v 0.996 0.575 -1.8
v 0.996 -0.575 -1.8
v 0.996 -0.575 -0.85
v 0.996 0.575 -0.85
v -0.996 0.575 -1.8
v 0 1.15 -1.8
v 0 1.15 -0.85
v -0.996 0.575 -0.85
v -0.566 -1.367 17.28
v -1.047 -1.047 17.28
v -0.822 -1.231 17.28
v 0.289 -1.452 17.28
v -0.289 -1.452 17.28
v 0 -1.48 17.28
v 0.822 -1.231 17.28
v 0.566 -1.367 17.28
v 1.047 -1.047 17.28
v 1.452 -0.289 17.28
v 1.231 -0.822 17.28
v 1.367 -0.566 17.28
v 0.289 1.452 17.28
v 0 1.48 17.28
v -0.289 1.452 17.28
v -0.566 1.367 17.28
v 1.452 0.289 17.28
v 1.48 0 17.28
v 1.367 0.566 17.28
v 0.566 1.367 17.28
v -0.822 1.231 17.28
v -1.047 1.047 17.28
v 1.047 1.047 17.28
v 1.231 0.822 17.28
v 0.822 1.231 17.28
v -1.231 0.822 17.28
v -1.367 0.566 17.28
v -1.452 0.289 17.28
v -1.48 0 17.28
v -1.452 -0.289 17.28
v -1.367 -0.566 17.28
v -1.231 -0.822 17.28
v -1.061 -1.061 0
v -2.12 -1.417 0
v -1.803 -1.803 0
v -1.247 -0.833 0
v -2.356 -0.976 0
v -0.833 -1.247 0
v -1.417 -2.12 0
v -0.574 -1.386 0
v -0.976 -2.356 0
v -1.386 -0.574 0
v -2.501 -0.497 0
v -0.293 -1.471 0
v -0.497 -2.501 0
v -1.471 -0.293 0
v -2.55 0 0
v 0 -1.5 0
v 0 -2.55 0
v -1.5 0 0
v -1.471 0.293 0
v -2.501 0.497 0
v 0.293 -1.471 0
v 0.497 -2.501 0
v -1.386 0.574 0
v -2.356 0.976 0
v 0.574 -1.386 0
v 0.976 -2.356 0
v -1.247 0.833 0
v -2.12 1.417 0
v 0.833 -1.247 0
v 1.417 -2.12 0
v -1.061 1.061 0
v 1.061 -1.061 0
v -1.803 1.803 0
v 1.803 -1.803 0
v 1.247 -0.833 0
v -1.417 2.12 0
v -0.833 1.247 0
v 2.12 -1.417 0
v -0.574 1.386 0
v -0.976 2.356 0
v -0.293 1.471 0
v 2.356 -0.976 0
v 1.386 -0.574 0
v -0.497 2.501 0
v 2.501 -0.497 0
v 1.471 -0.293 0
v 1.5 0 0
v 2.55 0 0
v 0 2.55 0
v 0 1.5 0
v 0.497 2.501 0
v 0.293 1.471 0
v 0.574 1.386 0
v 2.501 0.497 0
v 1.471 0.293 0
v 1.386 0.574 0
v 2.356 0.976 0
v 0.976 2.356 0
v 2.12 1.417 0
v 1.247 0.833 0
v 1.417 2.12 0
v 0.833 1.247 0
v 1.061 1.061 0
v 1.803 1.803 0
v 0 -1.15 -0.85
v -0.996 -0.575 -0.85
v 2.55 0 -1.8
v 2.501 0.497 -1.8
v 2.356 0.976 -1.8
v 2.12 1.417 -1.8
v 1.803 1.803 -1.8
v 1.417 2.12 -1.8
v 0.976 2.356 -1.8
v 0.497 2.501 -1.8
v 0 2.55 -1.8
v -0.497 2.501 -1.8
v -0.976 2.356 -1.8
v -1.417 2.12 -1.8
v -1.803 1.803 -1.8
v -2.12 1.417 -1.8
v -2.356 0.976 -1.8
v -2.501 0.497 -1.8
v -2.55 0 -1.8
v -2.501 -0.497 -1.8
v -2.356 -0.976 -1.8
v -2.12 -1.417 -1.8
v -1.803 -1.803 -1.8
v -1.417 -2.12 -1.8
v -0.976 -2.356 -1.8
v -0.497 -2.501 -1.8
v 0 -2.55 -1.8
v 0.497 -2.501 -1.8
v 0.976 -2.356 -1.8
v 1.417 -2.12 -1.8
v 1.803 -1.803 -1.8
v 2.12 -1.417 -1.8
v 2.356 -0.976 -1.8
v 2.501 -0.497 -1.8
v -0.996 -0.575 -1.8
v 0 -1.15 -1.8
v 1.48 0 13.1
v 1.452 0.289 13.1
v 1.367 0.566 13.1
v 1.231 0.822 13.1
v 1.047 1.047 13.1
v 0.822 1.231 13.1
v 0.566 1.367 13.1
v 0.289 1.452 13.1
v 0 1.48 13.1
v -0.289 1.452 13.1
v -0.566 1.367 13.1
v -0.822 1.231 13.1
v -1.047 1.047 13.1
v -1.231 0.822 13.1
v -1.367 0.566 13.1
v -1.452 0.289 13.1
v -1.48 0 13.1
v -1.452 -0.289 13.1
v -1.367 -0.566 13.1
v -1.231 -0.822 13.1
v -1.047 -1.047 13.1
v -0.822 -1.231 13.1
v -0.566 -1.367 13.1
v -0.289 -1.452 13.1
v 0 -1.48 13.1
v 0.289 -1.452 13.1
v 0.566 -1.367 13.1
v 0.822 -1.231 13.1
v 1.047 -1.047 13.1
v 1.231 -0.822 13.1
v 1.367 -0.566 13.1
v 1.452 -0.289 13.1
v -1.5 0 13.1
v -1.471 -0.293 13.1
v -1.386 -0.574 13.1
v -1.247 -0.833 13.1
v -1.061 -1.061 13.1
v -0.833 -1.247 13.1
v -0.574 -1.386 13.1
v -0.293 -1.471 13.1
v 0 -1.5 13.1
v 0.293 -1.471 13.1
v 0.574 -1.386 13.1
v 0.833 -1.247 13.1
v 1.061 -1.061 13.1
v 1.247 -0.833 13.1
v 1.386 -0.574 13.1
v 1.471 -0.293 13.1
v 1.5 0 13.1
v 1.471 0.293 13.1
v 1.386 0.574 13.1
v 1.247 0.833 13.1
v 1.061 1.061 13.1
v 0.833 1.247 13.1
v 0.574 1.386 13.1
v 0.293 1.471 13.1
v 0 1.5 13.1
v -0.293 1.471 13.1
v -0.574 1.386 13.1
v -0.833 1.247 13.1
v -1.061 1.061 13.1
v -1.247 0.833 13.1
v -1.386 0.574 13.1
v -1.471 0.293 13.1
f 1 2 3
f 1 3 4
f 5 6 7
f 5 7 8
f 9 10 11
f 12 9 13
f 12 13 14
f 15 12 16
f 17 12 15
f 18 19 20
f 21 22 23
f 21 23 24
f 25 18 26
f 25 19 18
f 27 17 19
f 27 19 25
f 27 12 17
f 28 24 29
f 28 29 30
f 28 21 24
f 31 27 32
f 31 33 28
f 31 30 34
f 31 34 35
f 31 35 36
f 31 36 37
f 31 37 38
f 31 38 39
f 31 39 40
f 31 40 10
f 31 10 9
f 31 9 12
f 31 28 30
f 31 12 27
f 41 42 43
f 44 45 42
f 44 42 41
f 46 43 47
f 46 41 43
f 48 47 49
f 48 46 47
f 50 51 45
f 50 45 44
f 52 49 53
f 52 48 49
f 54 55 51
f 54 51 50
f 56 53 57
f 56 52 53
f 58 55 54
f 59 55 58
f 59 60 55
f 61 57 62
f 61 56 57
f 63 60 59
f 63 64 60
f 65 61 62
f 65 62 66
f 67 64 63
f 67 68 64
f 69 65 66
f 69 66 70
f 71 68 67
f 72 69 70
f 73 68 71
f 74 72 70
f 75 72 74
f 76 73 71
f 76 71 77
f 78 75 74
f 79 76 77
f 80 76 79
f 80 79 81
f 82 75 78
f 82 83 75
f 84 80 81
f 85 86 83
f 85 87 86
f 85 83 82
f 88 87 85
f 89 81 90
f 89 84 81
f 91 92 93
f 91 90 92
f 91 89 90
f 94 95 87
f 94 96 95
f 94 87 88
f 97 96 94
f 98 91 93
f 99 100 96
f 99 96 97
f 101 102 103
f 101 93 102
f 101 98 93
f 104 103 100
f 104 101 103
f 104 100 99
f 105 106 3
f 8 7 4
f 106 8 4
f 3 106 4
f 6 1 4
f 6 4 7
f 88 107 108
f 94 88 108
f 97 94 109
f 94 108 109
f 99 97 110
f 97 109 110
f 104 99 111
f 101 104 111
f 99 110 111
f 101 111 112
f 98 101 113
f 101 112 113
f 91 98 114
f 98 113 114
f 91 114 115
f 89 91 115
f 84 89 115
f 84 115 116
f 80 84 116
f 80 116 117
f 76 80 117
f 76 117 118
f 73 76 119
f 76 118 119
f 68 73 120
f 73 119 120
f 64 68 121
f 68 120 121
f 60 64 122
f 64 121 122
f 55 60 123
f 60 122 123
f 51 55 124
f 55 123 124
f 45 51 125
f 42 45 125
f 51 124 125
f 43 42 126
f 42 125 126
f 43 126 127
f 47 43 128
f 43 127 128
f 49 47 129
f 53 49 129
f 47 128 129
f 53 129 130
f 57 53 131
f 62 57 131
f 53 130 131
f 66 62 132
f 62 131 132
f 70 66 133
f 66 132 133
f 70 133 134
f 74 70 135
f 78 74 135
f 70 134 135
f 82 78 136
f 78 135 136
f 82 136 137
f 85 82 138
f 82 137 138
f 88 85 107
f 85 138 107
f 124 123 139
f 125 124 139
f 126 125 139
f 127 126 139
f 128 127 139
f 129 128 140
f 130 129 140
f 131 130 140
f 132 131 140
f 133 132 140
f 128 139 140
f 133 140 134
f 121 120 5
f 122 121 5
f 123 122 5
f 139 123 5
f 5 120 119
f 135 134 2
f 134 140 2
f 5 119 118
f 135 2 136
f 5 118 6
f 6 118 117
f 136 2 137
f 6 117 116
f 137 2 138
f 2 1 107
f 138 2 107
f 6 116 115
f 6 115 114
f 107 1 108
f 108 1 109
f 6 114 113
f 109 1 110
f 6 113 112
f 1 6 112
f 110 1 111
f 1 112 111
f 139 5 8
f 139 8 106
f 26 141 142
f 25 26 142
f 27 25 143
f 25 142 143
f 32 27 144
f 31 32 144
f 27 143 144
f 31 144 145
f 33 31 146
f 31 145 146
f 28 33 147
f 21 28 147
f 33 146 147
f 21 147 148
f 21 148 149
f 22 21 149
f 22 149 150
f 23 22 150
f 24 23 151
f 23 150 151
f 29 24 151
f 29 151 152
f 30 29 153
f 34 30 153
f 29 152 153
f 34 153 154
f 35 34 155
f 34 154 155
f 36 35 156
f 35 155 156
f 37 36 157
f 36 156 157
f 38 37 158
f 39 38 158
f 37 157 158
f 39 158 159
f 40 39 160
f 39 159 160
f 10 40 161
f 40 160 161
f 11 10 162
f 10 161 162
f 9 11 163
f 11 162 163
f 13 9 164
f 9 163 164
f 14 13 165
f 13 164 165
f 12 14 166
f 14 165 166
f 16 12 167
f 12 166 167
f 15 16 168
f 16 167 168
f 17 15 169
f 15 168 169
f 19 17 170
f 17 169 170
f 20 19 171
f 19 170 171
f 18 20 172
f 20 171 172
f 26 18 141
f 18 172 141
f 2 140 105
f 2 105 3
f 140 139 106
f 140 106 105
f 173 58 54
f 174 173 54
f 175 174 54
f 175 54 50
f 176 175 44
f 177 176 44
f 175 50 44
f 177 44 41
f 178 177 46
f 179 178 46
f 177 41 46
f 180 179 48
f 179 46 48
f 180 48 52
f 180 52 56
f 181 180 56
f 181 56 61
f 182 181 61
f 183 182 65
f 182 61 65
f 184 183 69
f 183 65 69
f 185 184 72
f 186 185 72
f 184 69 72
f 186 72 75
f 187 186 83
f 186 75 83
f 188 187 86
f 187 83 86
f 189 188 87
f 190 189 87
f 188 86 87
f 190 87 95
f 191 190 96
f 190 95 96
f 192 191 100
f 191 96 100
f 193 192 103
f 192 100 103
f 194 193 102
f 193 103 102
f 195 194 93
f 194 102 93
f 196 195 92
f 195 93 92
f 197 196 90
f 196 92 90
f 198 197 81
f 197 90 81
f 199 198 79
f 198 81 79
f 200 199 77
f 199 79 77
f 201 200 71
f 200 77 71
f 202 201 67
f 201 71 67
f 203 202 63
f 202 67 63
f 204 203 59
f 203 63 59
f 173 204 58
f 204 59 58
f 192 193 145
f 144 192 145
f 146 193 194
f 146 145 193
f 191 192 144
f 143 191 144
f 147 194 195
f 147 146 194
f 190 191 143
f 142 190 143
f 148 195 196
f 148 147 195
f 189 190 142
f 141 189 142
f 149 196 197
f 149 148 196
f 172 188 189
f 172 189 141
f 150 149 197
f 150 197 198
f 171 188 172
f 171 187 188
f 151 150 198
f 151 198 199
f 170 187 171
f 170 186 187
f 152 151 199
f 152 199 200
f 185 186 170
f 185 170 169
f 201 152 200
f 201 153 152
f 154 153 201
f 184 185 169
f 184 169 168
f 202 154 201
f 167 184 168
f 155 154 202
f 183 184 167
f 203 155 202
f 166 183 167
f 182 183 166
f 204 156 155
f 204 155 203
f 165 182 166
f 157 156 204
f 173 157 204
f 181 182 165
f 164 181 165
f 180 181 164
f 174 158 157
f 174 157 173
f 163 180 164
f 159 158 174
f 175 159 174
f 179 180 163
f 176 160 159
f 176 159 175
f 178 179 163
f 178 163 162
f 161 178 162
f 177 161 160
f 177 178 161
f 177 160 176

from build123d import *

# Parameters (mm, degrees)
F_01_START                  = -1.8
S01_LOW_PROFILE_HEAD_R      = 2.55
F_01_LOW_PROFILE_HEAD_DEPTH = 1.8
S02_SMOOTH_JOURNAL_R        = 1.5
F_02_SMOOTH_JOURNAL_DEPTH   = 13.1
F_03_START                  = 13.1
S03_M3_THREADED_TIP_R       = 1.48
F_03_M3_THREADED_TIP_DEPTH  = 4.18
F_04_START                  = -1.9
F_04_HEX_SOCKET_DEPTH       = 1.05


with BuildPart() as part:
    # S01 - Low profile head → 01 - Low profile head (new body)
    with BuildSketch(Plane.XY.offset(F_01_START)):
        Circle(S01_LOW_PROFILE_HEAD_R)
    extrude(amount=F_01_LOW_PROFILE_HEAD_DEPTH)

    # S02 - Smooth journal → 02 - Smooth journal (add)
    with BuildSketch(Plane.XY):
        with Locations(Location((0, 0, 0), (0, 0, 180))):
            Circle(S02_SMOOTH_JOURNAL_R)
    extrude(amount=F_02_SMOOTH_JOURNAL_DEPTH)

    # S03 - M3 threaded tip → 03 - M3 threaded tip (add)
    with BuildSketch(Plane.XY.offset(F_03_START)):
        Circle(S03_M3_THREADED_TIP_R)
    extrude(amount=F_03_M3_THREADED_TIP_DEPTH)

    # S04 - Hex socket → 04 - Hex socket (cut)
    with BuildSketch(Plane.XY.offset(F_04_START)):
        Polygon((0.995929214, 0.575), (0, 1.15), (-0.995929214, 0.575), (-0.995929214, -0.575), (0, -1.15), (0.995929214, -0.575), align=None)
    extrude(amount=F_04_HEX_SOCKET_DEPTH, mode=Mode.SUBTRACT)


solid = part.part
